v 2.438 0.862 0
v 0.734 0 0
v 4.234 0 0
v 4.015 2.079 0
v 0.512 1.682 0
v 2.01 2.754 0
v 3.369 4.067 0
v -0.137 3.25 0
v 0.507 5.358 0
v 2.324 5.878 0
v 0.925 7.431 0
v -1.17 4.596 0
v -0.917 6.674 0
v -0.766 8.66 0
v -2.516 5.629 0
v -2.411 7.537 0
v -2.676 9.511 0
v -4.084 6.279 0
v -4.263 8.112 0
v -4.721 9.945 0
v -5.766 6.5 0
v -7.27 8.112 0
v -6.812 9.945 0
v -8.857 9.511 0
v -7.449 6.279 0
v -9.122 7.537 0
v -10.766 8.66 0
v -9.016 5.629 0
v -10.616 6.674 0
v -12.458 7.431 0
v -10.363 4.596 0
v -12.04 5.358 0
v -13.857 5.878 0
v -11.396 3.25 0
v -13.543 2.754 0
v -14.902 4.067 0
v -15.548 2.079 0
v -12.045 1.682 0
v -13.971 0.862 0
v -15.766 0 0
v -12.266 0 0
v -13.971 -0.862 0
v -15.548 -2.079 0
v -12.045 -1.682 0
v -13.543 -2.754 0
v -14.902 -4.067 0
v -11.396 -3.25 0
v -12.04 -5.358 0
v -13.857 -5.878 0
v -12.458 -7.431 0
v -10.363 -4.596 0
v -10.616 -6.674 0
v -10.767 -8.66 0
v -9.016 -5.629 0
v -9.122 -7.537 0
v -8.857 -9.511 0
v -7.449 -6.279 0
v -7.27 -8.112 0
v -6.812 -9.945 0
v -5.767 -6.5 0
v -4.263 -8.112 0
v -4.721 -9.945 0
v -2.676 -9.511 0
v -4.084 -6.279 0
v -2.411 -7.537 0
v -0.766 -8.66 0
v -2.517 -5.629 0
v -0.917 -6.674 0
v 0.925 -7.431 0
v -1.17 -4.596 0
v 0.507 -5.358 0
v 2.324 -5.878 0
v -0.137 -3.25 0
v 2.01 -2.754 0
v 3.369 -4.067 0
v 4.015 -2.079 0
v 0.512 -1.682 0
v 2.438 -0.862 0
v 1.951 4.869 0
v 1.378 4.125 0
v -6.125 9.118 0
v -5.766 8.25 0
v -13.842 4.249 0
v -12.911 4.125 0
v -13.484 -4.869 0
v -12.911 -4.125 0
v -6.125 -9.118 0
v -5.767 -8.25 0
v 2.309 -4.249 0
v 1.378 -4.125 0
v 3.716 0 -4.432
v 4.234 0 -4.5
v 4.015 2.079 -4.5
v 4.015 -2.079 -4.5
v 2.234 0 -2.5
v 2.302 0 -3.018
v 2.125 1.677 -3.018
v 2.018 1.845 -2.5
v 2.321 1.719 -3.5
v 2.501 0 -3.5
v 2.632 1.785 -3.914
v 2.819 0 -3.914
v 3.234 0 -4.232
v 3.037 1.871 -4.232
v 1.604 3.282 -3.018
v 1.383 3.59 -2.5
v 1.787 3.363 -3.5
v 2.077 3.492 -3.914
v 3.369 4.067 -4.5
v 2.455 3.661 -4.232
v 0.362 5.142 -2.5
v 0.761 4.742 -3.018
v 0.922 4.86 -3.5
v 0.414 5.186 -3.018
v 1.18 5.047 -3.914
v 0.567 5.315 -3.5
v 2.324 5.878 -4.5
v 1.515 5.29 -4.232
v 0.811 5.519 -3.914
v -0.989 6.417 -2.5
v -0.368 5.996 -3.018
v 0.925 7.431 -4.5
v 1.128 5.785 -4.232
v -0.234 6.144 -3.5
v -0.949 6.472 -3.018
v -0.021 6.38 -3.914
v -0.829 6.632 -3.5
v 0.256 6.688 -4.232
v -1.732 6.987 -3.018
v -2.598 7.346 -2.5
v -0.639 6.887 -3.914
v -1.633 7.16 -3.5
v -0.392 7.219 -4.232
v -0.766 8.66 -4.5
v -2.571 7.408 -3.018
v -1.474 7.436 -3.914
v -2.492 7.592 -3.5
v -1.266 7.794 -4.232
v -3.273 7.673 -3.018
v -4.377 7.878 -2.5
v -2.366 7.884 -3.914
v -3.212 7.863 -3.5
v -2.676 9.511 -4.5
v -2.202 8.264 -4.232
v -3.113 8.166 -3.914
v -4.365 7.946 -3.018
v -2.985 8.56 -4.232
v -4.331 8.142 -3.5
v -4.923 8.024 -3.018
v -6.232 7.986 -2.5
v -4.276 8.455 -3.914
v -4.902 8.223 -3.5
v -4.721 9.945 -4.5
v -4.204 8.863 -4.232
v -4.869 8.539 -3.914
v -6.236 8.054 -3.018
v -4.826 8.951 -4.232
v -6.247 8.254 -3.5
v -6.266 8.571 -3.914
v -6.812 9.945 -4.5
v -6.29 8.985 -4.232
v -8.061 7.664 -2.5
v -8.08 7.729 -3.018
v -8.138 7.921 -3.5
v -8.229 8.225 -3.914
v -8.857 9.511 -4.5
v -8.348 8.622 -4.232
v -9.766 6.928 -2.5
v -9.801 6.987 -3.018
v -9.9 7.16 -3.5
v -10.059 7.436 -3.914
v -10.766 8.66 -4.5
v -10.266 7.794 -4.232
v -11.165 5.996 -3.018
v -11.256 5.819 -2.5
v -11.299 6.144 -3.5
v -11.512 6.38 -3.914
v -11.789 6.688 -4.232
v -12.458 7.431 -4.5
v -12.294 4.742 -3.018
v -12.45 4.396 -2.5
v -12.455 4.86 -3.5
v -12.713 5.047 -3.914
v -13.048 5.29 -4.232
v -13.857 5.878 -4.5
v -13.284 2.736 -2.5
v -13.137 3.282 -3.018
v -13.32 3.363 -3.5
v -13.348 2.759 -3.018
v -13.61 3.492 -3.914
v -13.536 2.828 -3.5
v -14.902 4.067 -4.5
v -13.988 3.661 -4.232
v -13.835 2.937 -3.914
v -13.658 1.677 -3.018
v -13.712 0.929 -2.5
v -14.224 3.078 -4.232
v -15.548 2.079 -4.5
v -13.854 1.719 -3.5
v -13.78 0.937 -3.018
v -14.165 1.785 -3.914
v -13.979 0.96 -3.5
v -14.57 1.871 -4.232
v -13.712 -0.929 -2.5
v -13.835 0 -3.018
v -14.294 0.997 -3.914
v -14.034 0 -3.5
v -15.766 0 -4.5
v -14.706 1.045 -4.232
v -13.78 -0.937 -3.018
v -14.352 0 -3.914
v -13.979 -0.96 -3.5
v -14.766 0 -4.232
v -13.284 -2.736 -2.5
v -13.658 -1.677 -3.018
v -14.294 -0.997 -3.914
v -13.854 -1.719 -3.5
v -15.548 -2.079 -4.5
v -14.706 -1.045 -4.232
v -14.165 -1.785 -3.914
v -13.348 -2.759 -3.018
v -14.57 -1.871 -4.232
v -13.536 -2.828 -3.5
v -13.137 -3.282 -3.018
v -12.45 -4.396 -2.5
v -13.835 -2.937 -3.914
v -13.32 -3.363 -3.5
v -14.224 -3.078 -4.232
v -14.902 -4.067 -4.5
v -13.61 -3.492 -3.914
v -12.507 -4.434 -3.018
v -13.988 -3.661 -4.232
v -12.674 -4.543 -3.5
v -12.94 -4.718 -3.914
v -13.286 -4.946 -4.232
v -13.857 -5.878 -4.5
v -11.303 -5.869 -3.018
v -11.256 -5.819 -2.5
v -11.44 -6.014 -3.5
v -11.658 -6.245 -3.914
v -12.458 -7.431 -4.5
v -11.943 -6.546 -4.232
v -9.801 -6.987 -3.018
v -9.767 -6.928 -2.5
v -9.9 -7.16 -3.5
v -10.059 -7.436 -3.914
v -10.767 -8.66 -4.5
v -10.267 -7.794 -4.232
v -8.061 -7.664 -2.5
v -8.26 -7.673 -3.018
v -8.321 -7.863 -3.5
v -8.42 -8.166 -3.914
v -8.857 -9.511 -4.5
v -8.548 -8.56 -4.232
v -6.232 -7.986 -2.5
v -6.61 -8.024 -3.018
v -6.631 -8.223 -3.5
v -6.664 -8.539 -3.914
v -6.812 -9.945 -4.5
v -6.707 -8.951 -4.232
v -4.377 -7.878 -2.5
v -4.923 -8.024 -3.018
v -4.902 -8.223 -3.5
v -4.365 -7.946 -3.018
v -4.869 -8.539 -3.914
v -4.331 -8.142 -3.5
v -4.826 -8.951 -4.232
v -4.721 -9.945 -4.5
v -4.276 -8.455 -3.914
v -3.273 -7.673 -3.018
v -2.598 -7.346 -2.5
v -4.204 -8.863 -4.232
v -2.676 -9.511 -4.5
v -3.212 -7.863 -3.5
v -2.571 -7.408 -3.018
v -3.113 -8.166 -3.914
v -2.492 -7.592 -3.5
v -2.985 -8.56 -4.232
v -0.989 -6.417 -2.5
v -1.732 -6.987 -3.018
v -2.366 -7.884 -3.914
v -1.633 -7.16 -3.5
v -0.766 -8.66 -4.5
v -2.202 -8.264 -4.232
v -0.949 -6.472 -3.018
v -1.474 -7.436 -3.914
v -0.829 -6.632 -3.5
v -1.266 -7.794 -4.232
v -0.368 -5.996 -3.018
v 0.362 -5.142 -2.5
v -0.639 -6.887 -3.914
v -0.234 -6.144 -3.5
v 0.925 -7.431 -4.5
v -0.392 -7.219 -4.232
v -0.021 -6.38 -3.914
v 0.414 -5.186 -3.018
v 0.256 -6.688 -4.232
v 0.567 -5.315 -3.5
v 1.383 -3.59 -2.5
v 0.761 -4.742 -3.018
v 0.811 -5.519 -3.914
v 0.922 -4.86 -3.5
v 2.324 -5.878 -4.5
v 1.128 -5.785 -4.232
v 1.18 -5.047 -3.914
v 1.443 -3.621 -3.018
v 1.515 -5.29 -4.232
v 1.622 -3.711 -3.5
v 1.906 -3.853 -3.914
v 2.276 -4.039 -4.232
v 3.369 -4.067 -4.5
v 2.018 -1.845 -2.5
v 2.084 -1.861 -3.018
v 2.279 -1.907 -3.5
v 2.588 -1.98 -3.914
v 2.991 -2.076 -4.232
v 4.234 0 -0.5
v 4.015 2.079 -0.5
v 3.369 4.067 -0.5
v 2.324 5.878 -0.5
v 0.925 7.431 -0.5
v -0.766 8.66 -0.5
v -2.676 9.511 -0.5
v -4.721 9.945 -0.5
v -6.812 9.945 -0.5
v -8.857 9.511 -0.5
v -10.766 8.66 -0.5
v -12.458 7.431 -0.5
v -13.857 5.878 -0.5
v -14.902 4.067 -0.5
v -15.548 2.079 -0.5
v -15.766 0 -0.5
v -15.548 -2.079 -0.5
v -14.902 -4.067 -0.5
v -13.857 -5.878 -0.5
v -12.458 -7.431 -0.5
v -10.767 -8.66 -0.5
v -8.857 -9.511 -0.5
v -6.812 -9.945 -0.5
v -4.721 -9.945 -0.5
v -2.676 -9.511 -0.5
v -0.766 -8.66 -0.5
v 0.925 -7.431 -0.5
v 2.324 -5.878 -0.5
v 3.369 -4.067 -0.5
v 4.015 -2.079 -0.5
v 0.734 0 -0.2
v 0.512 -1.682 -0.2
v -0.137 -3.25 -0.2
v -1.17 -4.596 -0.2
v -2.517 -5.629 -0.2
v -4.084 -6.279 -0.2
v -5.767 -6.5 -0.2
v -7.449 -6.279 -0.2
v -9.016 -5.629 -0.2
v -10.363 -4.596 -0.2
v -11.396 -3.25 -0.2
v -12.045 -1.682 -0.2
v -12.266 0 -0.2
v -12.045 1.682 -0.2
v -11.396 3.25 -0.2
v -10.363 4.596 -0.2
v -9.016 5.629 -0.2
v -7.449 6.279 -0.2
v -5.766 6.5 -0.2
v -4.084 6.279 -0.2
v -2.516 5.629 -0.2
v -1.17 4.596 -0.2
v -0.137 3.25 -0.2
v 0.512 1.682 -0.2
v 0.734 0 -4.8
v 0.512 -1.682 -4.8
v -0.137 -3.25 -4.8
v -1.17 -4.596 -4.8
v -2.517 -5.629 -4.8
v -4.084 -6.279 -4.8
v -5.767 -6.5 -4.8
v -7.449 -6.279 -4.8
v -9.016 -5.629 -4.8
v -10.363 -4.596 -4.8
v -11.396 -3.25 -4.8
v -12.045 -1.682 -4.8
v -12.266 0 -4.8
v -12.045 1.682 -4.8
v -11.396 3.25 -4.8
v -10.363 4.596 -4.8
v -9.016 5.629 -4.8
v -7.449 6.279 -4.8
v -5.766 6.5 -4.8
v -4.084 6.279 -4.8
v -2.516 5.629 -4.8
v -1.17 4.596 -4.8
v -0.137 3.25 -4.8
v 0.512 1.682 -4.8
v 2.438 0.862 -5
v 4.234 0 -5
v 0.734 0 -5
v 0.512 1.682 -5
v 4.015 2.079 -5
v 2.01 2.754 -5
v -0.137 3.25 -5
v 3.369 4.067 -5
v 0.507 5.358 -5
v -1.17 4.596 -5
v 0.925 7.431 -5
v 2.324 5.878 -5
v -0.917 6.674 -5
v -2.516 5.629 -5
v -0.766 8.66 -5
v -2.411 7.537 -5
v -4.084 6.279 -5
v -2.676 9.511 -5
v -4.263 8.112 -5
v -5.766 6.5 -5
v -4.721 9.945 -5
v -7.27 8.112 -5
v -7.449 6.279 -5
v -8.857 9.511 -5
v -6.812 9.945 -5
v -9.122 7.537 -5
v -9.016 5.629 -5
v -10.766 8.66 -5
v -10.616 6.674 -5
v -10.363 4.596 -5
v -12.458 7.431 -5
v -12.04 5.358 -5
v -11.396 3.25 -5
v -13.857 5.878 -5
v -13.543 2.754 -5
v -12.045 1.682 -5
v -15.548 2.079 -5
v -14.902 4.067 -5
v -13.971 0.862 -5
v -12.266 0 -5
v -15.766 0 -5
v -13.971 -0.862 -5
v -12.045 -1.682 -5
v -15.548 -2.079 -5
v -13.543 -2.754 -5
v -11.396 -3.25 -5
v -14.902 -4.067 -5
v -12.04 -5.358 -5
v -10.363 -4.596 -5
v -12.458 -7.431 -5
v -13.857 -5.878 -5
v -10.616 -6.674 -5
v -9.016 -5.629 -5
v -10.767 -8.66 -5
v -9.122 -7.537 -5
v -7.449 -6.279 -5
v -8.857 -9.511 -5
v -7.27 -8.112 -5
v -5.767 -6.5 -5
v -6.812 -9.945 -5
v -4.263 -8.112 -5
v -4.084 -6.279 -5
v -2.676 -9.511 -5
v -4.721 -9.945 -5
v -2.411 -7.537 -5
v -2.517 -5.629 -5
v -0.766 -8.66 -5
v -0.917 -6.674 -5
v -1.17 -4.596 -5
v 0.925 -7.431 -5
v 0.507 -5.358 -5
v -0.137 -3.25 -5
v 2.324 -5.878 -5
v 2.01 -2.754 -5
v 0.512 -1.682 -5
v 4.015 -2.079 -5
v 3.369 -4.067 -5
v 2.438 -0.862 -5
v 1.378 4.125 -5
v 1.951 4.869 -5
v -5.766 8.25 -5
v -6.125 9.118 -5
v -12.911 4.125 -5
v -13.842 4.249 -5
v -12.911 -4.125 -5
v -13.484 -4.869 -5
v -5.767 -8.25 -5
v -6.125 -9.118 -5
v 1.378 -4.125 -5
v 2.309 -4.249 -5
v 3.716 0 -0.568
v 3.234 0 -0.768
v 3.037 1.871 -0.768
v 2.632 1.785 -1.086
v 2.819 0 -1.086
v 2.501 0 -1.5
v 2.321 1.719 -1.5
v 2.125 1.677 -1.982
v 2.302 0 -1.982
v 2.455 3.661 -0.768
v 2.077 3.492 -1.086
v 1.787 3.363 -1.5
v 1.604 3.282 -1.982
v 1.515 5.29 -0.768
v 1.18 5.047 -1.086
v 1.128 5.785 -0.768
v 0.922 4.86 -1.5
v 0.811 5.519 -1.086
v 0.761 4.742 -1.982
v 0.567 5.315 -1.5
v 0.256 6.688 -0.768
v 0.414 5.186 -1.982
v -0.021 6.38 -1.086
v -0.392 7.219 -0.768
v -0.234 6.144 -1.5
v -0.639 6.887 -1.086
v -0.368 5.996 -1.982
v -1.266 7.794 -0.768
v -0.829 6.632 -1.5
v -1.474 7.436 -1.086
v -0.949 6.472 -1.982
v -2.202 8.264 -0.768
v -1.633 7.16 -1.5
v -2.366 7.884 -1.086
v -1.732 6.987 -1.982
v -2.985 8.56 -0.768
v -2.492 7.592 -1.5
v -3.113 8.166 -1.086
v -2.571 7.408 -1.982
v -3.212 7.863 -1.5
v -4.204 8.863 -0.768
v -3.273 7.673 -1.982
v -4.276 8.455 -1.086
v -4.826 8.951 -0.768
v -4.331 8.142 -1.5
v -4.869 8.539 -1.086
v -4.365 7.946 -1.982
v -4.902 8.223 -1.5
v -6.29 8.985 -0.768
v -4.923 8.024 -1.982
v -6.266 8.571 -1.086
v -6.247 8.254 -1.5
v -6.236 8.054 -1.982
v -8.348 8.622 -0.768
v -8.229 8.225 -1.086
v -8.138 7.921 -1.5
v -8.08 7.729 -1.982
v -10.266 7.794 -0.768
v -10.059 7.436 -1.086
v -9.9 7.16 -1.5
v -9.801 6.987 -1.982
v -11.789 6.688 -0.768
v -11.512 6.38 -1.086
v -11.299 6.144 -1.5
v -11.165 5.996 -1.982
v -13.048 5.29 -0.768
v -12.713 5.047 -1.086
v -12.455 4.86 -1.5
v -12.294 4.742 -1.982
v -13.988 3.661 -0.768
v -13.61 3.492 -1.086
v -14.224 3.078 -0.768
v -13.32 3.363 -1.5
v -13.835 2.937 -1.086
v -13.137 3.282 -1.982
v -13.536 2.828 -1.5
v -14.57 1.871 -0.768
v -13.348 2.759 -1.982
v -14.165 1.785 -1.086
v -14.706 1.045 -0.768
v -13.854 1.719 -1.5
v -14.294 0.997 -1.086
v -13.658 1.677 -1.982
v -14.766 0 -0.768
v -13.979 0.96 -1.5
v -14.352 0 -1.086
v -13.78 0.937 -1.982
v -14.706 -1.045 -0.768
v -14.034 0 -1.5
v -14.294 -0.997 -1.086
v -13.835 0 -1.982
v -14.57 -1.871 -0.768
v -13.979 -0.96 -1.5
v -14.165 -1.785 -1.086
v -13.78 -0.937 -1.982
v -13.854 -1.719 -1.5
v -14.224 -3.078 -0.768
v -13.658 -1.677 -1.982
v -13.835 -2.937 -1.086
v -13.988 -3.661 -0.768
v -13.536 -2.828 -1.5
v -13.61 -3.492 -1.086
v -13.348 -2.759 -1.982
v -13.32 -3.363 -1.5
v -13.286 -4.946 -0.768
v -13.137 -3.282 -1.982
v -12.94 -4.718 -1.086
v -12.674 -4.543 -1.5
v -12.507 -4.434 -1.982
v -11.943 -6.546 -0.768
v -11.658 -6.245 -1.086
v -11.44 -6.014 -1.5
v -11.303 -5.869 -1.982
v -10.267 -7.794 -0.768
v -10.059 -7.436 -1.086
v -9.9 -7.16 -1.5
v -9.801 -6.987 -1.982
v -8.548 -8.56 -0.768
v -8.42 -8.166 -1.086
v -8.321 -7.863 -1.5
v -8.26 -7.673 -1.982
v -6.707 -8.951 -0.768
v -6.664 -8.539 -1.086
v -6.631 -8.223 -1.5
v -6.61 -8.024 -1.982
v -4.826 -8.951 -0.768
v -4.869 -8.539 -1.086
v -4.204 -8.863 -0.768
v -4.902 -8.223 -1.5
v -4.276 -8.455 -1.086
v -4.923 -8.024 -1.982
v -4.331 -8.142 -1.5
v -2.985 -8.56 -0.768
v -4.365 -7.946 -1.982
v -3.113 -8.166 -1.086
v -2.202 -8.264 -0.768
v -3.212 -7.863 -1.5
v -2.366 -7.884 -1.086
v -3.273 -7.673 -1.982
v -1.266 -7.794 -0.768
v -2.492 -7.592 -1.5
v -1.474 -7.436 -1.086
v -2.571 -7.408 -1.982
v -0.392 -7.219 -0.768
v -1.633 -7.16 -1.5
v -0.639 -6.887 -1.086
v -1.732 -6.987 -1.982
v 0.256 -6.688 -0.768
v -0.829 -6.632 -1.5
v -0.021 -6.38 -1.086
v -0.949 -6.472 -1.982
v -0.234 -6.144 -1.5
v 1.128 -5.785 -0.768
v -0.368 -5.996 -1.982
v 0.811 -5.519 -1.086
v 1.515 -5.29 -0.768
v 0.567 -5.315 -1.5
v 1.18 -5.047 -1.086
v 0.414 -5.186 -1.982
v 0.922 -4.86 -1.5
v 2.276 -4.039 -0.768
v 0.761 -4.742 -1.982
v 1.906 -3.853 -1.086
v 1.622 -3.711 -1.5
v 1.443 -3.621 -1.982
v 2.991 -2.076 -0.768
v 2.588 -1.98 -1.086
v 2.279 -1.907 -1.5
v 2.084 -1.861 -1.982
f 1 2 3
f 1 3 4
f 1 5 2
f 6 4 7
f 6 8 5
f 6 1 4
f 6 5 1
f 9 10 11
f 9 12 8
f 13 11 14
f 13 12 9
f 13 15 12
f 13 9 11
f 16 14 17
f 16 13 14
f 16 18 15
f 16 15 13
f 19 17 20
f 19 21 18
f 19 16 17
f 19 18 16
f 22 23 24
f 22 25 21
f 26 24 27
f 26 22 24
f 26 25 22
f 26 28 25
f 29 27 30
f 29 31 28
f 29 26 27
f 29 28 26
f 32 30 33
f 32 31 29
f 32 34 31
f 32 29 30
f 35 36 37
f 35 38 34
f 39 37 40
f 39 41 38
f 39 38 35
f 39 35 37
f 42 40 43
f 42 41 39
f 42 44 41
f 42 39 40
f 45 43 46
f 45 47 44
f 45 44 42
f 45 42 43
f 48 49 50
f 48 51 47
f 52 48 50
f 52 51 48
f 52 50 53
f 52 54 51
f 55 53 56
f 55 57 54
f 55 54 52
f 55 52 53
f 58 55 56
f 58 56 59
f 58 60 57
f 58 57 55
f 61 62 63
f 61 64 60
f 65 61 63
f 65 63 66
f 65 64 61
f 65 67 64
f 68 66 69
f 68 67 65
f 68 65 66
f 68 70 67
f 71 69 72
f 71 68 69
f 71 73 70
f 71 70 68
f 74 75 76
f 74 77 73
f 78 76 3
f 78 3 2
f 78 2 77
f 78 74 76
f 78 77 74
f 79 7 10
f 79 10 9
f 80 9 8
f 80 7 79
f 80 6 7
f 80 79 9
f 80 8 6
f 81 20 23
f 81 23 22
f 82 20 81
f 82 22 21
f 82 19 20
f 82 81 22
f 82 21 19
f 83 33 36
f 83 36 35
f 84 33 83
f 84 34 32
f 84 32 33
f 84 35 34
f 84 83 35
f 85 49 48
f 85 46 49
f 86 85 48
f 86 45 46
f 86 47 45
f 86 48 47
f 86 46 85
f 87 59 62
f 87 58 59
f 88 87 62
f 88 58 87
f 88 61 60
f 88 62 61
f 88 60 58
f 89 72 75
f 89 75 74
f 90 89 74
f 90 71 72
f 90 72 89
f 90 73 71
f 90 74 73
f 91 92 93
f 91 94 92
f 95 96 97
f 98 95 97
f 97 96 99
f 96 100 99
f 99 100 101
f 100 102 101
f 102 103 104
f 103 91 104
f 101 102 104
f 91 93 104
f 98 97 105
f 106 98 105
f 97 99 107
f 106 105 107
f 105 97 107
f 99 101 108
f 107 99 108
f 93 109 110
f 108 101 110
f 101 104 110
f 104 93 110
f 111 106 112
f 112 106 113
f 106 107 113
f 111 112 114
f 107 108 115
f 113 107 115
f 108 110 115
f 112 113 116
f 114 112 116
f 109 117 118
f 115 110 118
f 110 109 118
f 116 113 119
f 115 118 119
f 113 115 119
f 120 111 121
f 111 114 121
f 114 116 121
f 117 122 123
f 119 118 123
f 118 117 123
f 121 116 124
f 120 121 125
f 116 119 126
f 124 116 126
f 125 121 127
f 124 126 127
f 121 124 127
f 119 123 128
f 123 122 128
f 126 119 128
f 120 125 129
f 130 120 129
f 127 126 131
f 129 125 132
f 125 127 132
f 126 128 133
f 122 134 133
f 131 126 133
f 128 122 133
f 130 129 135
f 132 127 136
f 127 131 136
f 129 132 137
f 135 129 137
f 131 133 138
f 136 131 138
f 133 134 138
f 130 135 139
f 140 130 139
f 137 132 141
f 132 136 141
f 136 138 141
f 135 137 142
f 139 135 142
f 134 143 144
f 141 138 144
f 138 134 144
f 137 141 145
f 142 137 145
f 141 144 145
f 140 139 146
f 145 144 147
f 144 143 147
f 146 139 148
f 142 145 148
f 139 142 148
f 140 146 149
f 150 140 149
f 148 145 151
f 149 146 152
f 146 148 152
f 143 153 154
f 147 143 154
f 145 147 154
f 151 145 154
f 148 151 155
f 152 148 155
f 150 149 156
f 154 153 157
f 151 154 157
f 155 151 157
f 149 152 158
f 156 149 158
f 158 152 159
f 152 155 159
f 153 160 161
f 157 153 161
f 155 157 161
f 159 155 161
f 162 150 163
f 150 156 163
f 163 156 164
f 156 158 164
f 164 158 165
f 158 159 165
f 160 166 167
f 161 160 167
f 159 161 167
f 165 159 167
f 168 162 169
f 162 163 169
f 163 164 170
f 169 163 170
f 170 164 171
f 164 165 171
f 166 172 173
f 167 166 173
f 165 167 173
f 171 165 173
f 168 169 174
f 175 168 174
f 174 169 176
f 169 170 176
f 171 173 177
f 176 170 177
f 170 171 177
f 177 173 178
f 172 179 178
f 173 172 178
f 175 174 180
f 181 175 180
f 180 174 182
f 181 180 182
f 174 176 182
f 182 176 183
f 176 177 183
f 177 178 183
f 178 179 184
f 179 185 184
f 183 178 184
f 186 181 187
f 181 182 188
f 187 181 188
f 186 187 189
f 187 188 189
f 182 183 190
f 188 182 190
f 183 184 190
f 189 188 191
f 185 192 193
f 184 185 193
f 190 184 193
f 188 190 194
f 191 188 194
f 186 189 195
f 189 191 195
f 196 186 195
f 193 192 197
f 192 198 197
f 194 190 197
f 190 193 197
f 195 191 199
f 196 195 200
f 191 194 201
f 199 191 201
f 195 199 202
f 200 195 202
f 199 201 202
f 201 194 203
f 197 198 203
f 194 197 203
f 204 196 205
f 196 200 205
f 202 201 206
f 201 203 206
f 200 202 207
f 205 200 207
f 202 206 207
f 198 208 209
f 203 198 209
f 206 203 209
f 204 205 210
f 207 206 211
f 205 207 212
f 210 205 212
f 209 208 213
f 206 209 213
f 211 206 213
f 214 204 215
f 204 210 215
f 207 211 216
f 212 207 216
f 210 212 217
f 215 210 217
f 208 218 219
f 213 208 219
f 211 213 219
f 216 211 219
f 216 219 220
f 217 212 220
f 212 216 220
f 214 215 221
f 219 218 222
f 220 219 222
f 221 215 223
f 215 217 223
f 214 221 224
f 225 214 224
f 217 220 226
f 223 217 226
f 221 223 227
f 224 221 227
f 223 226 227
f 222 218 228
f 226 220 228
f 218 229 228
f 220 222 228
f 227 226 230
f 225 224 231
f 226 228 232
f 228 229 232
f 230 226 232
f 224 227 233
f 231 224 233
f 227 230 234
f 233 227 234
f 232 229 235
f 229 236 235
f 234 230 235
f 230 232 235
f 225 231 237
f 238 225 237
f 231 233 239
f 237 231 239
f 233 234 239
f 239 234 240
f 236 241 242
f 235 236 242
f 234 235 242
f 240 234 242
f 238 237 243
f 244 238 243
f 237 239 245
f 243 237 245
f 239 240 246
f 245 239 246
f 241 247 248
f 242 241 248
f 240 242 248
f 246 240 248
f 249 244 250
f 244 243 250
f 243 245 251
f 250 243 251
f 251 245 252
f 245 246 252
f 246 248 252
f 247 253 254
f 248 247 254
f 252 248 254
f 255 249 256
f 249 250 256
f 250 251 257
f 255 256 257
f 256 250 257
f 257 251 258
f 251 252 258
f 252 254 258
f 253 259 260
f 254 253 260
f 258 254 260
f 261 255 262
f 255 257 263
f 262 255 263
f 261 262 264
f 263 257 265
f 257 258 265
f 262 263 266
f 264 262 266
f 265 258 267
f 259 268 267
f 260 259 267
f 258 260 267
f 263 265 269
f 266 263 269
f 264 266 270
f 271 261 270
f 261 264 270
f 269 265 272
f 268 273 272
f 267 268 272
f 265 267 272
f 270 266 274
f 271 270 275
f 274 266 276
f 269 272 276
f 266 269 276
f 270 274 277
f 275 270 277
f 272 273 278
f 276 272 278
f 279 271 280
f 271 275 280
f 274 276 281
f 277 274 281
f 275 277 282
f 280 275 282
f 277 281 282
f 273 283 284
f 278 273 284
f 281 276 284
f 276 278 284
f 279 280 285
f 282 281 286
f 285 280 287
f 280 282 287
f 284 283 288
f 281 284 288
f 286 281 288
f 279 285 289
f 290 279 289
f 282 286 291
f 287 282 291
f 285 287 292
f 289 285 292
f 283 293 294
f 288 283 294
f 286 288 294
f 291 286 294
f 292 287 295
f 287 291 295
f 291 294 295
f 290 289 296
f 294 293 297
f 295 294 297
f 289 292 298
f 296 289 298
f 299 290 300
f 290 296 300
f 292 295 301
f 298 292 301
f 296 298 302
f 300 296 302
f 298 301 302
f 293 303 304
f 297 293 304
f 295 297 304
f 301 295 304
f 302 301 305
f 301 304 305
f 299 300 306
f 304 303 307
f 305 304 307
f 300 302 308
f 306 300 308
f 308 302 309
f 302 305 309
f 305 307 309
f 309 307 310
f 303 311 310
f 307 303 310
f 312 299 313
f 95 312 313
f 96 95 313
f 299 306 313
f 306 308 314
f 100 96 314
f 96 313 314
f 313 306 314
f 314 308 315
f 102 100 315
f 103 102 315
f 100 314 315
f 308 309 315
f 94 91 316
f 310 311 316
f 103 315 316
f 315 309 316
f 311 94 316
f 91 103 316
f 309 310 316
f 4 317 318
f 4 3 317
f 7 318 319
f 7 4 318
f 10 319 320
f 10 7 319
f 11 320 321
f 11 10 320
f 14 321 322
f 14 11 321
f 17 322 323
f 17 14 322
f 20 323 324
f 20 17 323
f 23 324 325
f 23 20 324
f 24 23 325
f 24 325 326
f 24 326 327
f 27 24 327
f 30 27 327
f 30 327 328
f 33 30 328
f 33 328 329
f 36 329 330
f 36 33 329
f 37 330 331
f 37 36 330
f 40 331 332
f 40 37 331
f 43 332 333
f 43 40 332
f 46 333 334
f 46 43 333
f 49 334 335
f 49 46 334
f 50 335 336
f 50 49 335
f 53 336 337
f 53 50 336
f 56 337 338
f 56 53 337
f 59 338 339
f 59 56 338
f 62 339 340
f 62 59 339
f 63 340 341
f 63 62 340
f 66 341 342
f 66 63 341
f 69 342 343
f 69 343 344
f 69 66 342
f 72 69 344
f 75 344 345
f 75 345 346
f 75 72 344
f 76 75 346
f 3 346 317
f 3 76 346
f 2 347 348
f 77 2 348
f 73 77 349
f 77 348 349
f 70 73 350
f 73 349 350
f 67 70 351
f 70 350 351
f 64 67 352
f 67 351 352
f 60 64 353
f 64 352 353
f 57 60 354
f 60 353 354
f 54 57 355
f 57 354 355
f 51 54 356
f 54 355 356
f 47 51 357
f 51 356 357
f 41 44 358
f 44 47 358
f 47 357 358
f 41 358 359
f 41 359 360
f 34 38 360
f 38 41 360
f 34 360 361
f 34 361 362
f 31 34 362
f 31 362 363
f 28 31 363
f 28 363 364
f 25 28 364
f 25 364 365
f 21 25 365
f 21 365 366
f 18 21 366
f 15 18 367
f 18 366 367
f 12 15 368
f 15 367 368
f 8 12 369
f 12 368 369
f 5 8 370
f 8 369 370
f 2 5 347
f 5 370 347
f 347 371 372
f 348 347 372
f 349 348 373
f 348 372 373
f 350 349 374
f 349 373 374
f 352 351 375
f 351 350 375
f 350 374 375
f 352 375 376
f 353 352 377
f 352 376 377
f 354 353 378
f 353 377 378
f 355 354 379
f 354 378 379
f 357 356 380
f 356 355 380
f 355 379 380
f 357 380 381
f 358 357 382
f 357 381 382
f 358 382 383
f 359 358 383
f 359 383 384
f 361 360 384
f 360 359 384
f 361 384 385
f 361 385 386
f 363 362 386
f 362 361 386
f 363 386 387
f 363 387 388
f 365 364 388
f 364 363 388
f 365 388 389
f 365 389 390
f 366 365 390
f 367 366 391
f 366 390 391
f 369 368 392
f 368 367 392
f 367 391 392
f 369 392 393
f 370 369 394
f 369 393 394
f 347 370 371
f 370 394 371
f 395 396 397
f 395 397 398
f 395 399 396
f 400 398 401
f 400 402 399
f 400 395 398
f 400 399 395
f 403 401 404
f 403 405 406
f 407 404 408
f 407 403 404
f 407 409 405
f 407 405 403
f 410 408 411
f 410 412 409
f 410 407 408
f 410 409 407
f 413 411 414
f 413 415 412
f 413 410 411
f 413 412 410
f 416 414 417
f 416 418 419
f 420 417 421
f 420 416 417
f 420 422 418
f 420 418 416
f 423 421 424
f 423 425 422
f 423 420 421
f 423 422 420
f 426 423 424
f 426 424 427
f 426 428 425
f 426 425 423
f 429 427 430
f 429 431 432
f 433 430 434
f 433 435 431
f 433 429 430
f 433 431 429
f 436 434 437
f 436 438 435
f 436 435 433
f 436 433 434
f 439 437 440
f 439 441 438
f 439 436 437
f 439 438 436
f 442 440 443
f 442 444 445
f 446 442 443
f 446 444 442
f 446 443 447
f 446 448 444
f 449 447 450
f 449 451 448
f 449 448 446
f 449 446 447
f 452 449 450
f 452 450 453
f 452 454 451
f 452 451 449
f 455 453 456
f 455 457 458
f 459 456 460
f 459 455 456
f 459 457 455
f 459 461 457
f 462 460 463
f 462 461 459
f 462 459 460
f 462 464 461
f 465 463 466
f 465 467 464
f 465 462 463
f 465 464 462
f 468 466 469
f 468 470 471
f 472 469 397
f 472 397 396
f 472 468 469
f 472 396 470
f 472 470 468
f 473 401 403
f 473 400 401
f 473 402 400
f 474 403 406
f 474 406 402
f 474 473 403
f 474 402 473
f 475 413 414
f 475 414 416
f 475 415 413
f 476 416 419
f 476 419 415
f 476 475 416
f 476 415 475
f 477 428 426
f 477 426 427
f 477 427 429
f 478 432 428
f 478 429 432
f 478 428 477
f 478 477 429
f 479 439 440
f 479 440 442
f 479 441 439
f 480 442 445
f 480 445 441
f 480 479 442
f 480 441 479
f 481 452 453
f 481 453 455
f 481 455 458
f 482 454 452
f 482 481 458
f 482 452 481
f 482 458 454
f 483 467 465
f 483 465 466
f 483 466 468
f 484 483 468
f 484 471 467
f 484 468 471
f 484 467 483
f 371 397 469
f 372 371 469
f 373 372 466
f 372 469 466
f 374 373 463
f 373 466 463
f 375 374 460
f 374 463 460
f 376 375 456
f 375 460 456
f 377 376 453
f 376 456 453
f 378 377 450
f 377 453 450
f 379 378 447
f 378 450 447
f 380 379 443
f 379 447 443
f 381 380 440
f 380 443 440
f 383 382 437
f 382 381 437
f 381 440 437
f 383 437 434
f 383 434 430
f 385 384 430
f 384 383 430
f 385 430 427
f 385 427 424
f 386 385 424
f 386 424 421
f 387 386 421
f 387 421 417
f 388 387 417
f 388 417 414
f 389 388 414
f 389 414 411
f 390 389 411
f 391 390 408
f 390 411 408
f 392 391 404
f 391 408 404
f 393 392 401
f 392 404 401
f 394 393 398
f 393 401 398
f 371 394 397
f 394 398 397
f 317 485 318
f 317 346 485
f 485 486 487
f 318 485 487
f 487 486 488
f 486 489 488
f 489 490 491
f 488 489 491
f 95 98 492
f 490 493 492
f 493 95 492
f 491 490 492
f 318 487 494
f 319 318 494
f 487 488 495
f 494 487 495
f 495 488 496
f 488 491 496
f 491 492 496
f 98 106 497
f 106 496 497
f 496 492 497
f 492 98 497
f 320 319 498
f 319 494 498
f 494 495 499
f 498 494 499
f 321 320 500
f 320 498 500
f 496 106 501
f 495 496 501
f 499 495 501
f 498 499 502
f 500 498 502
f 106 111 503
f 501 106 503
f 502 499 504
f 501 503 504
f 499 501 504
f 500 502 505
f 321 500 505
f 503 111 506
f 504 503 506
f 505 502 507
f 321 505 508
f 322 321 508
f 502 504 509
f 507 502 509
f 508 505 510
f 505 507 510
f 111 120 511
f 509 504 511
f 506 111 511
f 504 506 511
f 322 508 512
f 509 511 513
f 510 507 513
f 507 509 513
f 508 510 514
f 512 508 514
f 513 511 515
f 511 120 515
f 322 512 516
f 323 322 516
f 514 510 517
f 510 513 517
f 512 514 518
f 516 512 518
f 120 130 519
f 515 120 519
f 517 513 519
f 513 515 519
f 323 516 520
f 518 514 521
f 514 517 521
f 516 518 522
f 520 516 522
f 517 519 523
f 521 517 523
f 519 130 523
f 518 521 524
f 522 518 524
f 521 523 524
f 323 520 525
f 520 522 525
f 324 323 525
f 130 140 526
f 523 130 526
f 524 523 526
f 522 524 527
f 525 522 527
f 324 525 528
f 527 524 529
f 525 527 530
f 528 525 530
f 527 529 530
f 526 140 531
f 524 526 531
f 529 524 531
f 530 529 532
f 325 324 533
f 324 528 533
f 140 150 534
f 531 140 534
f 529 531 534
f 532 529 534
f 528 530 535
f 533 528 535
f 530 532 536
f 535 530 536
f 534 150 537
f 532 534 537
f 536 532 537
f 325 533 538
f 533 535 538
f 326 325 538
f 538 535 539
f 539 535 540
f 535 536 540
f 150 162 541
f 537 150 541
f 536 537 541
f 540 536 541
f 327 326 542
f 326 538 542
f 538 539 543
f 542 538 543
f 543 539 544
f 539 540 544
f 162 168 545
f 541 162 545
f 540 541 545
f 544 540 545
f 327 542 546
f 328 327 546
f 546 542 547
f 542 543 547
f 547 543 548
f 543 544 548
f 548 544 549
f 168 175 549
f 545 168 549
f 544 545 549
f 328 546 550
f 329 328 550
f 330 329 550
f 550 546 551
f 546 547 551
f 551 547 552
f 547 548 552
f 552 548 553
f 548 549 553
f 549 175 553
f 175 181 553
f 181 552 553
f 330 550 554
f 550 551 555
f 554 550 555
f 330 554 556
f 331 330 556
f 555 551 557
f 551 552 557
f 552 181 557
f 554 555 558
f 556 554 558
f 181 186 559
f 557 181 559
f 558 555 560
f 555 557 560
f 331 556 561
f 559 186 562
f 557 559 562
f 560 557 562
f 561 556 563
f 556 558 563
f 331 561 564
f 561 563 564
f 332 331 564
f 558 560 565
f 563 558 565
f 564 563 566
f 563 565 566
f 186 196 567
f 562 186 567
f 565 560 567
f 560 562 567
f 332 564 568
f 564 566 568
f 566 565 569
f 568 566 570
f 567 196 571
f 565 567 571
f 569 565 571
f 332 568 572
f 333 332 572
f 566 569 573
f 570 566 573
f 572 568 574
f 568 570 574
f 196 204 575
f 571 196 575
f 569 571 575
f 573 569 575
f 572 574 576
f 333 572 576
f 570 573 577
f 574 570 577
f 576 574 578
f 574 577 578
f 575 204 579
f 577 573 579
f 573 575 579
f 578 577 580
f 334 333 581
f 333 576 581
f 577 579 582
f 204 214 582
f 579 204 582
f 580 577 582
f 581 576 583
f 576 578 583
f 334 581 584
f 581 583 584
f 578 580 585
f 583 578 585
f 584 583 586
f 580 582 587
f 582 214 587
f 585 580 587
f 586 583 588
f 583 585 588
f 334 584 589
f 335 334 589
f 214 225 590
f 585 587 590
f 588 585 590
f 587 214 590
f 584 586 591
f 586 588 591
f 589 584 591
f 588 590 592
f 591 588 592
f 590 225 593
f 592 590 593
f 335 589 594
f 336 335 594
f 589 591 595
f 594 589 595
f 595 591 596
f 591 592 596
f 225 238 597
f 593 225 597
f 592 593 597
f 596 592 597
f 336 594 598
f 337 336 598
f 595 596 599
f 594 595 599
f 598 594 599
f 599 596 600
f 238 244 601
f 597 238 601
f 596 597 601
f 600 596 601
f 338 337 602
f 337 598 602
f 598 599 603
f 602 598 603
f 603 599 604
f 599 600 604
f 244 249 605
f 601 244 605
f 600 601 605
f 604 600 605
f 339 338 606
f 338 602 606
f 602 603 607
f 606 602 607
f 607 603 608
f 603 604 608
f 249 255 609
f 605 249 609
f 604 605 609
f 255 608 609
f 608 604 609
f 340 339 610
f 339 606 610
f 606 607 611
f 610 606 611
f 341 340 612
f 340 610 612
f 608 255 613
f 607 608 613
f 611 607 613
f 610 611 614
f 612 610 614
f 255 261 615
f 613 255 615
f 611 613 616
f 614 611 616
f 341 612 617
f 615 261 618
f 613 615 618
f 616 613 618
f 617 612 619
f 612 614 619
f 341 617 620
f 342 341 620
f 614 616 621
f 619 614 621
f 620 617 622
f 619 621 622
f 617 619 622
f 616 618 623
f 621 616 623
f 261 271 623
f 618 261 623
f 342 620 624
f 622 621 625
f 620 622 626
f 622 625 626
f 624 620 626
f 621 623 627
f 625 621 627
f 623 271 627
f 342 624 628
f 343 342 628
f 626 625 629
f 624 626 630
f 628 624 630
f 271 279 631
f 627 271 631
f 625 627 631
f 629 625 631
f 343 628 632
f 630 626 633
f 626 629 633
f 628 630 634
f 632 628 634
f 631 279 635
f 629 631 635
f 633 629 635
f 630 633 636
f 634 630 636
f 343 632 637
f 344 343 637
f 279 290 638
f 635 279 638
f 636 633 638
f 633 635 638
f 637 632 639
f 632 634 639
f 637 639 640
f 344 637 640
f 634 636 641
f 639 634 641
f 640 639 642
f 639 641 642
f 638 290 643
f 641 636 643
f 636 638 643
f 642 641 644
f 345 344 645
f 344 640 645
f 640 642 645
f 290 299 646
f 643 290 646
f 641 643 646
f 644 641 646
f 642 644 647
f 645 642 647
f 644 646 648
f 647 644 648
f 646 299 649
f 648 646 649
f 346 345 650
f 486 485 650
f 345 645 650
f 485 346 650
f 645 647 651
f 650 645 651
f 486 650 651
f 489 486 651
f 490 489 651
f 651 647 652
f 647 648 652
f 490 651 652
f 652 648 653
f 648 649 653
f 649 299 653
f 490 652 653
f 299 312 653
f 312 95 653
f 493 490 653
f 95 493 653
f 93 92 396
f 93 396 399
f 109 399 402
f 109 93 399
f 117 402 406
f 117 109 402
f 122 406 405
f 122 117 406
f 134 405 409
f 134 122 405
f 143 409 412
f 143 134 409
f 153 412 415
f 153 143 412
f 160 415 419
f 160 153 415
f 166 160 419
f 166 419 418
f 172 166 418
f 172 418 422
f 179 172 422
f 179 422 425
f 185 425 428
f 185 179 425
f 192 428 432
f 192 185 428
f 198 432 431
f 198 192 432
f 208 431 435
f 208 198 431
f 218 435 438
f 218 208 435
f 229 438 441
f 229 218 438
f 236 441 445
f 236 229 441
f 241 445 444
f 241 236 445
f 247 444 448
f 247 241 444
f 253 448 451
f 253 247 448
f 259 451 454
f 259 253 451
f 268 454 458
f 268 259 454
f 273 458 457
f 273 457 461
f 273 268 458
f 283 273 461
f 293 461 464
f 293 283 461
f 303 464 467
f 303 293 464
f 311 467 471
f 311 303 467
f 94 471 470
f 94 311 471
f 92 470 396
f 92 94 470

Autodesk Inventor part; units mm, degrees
ref_plane "YZ Plane" through (0, 0, 0) normal (1, 0, 0) x (0, 1, 0)
ref_plane "XZ Plane" through (0, 0, 0) normal (0, 1, 0) x (-1, 0, 0)
ref_plane "XY Plane" through (0, 0, 0) normal (0, 0, 1) x (1, 0, 0)
sketch "Skizze1" plane through (0, 0, 0) normal (0, 0, 1) x (1, 0, 0)
  circle A0 centre (-5.7665, 0) radius 6.5 projected
  circle A1 centre (-5.7665, 0) radius 10
  point P0 (0, 0)
  dimension "d0" = 20
sketch "Skizze2" plane through (0, 0, 0) normal (1, 0, 0) x (0, 1, 0)
  line L0 (6.5, 0) -> (-6.5, 0) construction
  line L1 (10, 0) -> (-10, 0) construction
  line L2 (10, 0) -> (10, -0.5)
  arc A0 (10, -0.5) -> (8, -2.5) centre (10, -2.5) ccw
  line L3 (6.5, -4.8) -> (6.5, -0.2) construction
  line L4 (8, -2.5) -> (6.5, -2.5) construction
  line L5 (10, -5) -> (10, -4.5)
  arc A1 (8, -2.5) -> (10, -4.5) centre (10, -2.5) ccw
  line L6 (8, -2.5) -> (8, -1.525) construction
  line L7 (10, -0.5) -> (8.7772, -0.5) construction
  point P0 (0, 0)
  dimension "d4" = 1.5
ref_plane "Arbeitsebene1" through (-5.7665, 0, 0) normal (1, 0, 0) x (0, 1, 0)
sketch "Skizze3" plane through (-5.7665, 0, 0) normal (1, 0, 0) x (0, 1, 0)
  line L0 (10, 0) -> (10, -0.5) projected
  arc A0 (10, -0.5) -> (8, -2.5) centre (10, -2.5) ccw projected
  arc A1 (8, -2.5) -> (10, -4.5) centre (10, -2.5) ccw projected
  line L1 (10, -5) -> (10, -4.5) projected
  line L2 (10, -5) -> (6.5, -5)
  line L3 (6.5, -5) -> (6.5, 0)
  line L4 (6.5, 0) -> (10, 0)
  line L5 (6.5, -4.8) -> (6.5, -0.2)
  line L6 (6.3, -5) -> (-6.3, -5) projected
  point P0 (0, 0)
  dimension "d9" = 8
sweep "Sweeping2" add profiles "Skizze3" path "Skizze1" path curves A1
properties part number "Umlenkfläche" material "PC/ABS-Kunststoff, Umlenkrolle"
